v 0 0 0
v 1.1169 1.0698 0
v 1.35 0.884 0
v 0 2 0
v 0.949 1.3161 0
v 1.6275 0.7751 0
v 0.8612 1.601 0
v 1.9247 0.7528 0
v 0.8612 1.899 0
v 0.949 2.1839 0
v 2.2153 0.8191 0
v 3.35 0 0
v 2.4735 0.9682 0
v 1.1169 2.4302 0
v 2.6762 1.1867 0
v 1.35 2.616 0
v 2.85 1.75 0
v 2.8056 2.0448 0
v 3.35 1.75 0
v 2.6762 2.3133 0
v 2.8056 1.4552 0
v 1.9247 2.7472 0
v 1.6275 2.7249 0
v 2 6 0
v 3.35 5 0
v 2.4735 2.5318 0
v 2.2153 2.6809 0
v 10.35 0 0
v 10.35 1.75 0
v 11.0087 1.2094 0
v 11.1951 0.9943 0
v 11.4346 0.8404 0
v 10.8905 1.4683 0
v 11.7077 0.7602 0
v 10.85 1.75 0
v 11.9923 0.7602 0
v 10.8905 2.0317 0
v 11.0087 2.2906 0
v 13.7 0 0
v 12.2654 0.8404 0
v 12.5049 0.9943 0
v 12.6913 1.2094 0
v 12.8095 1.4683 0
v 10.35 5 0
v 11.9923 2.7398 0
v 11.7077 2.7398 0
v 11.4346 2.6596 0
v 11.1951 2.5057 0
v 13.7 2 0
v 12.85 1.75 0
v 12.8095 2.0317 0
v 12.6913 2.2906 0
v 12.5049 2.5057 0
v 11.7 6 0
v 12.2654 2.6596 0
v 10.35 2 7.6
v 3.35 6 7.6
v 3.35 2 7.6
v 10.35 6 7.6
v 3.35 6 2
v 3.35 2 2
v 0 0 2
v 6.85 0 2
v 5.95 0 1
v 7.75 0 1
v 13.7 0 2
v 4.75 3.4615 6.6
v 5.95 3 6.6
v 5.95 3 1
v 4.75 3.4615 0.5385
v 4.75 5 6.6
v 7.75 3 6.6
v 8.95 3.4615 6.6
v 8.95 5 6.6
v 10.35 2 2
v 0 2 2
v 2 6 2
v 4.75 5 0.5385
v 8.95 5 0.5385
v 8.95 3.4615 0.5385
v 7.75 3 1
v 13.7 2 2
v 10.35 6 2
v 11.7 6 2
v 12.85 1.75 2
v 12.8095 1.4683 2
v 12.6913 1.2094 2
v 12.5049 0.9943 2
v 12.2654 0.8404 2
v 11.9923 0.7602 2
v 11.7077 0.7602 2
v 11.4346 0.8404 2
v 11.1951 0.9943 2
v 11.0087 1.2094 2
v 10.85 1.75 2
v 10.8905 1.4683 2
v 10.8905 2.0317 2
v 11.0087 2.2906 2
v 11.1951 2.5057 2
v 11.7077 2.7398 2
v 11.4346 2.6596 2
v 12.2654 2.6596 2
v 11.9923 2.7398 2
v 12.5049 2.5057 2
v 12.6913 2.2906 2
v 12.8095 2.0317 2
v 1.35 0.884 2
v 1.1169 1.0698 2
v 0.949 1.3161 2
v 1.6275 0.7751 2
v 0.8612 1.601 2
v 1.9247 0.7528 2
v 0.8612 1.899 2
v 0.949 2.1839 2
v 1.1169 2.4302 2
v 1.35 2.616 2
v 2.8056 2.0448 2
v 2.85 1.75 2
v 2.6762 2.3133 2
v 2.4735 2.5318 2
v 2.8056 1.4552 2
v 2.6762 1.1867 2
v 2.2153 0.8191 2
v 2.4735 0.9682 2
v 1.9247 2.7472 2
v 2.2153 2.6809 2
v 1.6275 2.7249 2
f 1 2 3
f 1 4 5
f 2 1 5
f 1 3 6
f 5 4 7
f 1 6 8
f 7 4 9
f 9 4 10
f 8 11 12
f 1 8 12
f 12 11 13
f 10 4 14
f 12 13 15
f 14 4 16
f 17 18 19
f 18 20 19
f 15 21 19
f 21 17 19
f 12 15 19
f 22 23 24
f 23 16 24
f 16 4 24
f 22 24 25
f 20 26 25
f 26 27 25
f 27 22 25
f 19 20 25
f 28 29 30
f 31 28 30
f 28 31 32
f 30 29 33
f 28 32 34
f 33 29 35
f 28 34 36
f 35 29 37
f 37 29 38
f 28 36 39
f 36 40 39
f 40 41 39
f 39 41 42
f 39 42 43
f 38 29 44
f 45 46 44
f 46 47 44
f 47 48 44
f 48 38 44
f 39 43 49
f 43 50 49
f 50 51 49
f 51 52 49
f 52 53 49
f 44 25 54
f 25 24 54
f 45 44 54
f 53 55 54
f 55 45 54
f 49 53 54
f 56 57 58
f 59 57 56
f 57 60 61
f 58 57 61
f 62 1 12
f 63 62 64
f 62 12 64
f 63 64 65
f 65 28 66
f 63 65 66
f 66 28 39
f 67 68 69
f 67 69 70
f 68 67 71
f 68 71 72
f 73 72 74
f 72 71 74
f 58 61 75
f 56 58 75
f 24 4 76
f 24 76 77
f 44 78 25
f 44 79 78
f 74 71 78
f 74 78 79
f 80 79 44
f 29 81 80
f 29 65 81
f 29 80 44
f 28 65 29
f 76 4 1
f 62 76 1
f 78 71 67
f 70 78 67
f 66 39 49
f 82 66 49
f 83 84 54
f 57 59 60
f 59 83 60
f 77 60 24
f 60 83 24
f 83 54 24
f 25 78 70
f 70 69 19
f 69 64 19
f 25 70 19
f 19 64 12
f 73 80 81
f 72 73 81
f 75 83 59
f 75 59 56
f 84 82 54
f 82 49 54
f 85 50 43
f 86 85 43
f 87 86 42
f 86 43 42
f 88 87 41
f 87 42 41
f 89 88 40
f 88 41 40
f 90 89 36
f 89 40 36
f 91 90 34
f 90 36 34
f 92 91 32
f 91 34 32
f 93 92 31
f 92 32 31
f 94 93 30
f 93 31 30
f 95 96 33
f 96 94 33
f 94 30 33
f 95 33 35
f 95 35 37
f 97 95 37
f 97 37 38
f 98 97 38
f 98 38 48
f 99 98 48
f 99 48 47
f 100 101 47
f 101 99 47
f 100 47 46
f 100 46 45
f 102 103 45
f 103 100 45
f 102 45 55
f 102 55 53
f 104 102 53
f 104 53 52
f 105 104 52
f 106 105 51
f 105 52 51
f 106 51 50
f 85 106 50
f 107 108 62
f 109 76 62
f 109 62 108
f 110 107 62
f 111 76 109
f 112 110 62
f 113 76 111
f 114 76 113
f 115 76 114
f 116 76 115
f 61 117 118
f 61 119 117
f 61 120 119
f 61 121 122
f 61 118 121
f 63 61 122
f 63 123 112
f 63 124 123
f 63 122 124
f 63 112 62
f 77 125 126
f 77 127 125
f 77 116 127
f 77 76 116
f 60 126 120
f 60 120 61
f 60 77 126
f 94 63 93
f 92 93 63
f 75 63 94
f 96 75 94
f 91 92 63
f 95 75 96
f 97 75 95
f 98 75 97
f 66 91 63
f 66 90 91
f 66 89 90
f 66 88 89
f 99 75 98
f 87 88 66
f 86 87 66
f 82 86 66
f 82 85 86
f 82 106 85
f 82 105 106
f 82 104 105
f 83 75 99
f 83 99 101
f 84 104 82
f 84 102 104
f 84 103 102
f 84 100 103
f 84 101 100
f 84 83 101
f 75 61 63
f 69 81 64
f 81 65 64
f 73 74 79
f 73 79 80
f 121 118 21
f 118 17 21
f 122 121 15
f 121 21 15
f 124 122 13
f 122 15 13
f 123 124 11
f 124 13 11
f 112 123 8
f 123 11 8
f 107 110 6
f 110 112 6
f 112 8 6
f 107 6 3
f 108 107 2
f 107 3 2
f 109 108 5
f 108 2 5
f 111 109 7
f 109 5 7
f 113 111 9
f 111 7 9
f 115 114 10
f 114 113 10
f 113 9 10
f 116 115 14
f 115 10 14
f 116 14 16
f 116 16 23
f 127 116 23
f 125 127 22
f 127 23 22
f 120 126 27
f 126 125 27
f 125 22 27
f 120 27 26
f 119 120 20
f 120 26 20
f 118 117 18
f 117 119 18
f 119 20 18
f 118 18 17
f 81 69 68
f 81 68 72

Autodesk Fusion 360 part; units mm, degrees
sketch "mainBase" plane through (0, 0, 0) normal (0, 0, 1) x (1, 0, 0)
  line L0 (0, 0) -> (13.7, 0)
  line L1 (13.7, 0) -> (13.7, 6)
  line L2 (13.7, 6) -> (0, 6)
  line L3 (0, 6) -> (0, 0)
  line L4 (0, 0) -> (6.85, 0)
  line L5 (6.85, 0) -> (6.85, 1.75)
  line L6 (6.85, 1.75) -> (1.85, 1.75)
  line L7 (6.85, 1.75) -> (11.85, 1.75)
  line L8 (0, 6) -> (6.85, 6)
  circle A0 centre (1.85, 1.75) radius 1
  circle A1 centre (11.85, 1.75) radius 1
  line L9 (6.85, 6) -> (3.35, 6)
  line L10 (3.35, 6) -> (3.35, 2)
  line L11 (3.35, 2) -> (6.85, 2)
  line L12 (6.85, 2) -> (6.85, 6)
  line L13 (6.85, 6) -> (10.35, 6)
  line L14 (10.35, 6) -> (10.35, 2)
  line L15 (10.35, 2) -> (6.85, 2)
  line L16 (6.85, 2) -> (6.85, 6)
  dimension "d9" = 6
  dimension "d10" = 13.7
  dimension "d11" = 6.85
  dimension "d12" = 1.75
  dimension "d13" = 5
  dimension "d14" = 5
  dimension "d15" = 6.85
  dimension "d17" = 2
  dimension "d18" = 2
  dimension "d19" = 4
  dimension "d20" = 3.5
  dimension "d21" = 4
  dimension "d22" = 3.5
extrude "Extrude1" add sketch "mainBase" along normal blind 7.6 contours L2 L8 L9 L10 L11 L12 L16 | L2 L12 L13 L14 L15 L16
shell "Shell1" thickness 1 removed faces 1 at (5.6833, 4.6667, 0)
extrude "Extrude2" add sketch "mainBase" along normal blind 2 contours L0 L1 L2 L3 L4 L8 L10 L11 L14 L15
sketch "hallCutOut" plane through (0, 0, 0) normal (0, 0, 1) x (1, 0, 0)
  line L0 (0, 6) -> (6.85, 6)
  line L1 (6.85, 6) -> (6.85, 2)
  line L2 (6.85, 2) -> (3.35, 2)
  line L3 (3.35, 2) -> (3.35, 4)
  line L4 (6.85, 2) -> (6.85, 3)
  line L5 (6.85, 3) -> (5.95, 3)
  line L6 (5.95, 3) -> (3.35, 4)
  line L7 (6.85, 3) -> (7.75, 3)
  line L8 (6.85, 2) -> (10.35, 2)
  line L9 (10.35, 2) -> (10.35, 4)
  line L10 (10.35, 4) -> (7.75, 3)
  line L11 (7.75, 3) -> (9.35, 3)
  line L12 (9.35, 3) -> (9.35, 3.6154)
  line L13 (5.95, 3) -> (4.35, 3)
  line L14 (4.35, 3) -> (4.35, 3.6154)
  line L15 (6.85, 5) -> (8.95, 5)
  line L16 (8.95, 5) -> (8.95, 3)
  line L17 (8.95, 3) -> (6.85, 3)
  line L18 (6.85, 3) -> (6.85, 5)
  line L19 (6.85, 5) -> (4.75, 5)
  line L20 (4.75, 5) -> (4.75, 3)
  line L21 (4.75, 3) -> (6.85, 3)
  line L22 (6.85, 3) -> (6.85, 5)
  line L23 (9.35, 3) -> (4.35, 3)
  line L24 (4.35, 3) -> (4.35, 5)
  line L25 (4.35, 5) -> (9.35, 5)
  line L26 (9.35, 5) -> (9.35, 3)
  dimension "d31" = 6.85
  dimension "d32" = 4
  dimension "d33" = 3.5
  dimension "d34" = 2
  dimension "d35" = 1
  dimension "d36" = 0.9
  dimension "d37" = 0.9
  dimension "d38" = 3.5
  dimension "d39" = 2
  dimension "d59" = 2.1
extrude "Extrude3" add sketch "hallCutOut" along normal blind 6.6 contours L6 L13 L20 L21 L23 | L10 L11 L16 L17 L23 | L10 L11 L12 L16 L23 L26 | L6 L13 L14 L20 L23 L24
sketch "wireCutOut" plane through (0, 0, 0) normal (0, -1, 0) x (1, 0, 0)
  line L0 (0, 0) -> (13.7, 0)
  line L1 (13.7, 0) -> (13.7, 2)
  line L2 (13.7, 2) -> (0, 2)
  line L3 (0, 2) -> (0, 0)
  line L4 (0, 0) -> (6.85, 0)
  line L5 (6.85, 0) -> (6.85, 1)
  line L6 (6.85, 1) -> (5.95, 1)
  line L7 (6.85, 1) -> (7.75, 1)
  line L8 (6.85, 0) -> (13.7, 0)
  line L9 (6.85, 0) -> (10.35, 0)
  line L10 (6.85, 0) -> (3.35, 0)
  line L11 (7.75, 1) -> (10.35, 0)
  line L12 (5.95, 1) -> (3.35, 0)
  dimension "d42" = 6.85
  dimension "d43" = 1
  dimension "d44" = 0.9
  dimension "d45" = 0.9
  dimension "d46" = 6.85
  dimension "d47" = 3.5
  dimension "d48" = 3.5
extrude "Extrude4" cut sketch "wireCutOut" against normal blind 5 contours L0 L4 L5 L6 L10 L12 | L0 L5 L7 L8 L9 L11
sketch "cutOut" plane through (0, 0, 0) normal (0, 0, 1) x (1, 0, 0)
  line L0 (0, 0) -> (13.7, 0)
  line L1 (13.7, 0) -> (13.7, 6)
  line L2 (13.7, 6) -> (0, 6)
  line L3 (0, 6) -> (0, 0)
  line L4 (13.7, 0) -> (13.7, 2)
  line L5 (0, 0) -> (0, 2)
  line L6 (0, 6) -> (2, 6)
  line L7 (13.7, 6) -> (11.7, 6)
  line L8 (0, 2) -> (2, 6)
  line L9 (13.7, 2) -> (11.7, 6)
  dimension "d51" = 6
  dimension "d52" = 13.7
  dimension "d53" = 2
  dimension "d54" = 2
  dimension "d55" = 2
  dimension "d56" = 2
extrude "Extrude5" cut sketch "cutOut" along normal blind 2 contours L2 L3 L6 L8 | L1 L2 L7 L9
extrude "Extrude6" add sketch "hallCutOut" along normal blind 7.6 contours L10 L16 L25 L26 | L6 L20 L24 L25
extrude "Extrude7" cut sketch "wireCutOut" against normal blind 5 contours L0 L4 L5 L6 L10 L12 | L0 L5 L7 L8 L9 L11
equation "baseLength = 6 mm"
equation "baseWidth = 13.7 mm"
equation "mountingCircleToMountingCircle = 10 mm"
equation "mountingHoleFromEdge = 1.75 mm"
equation "hallEffectWidth = 7 mm"
equation "hallEffectLength = 4 mm"
equation "hallEffectHeight = 7.6 mm"
equation "baseHeight = 2 mm"
equation "d9 = baseLength"
equation "d10 = baseWidth"
equation "d11 = baseWidth / 2"
equation "d12 = mountingHoleFromEdge"
equation "d13 = mountingCircleToMountingCircle / 2"
equation "d14 = mountingCircleToMountingCircle / 2"
equation "d15 = baseWidth / 2"
equation "screwHole = 2 mm"
equation "d17 = screwHole"
equation "d18 = screwHole"
equation "d19 = hallEffectLength"
equation "d20 = hallEffectWidth / 2"
equation "d21 = hallEffectLength"
equation "d22 = hallEffectWidth / 2"
equation "d23 = hallEffectHeight"
equation "hallEffectThickness = 1 mm"
equation "d26 = hallEffectThickness"
equation "d27 = baseHeight"
equation "traingleHeight = 2 mm"
equation "hallEffectMiddleDist = 1.8 mm"
equation "d31 = baseWidth / 2"
equation "d32 = hallEffectLength"
equation "d33 = hallEffectWidth / 2"
equation "d34 = traingleHeight"
equation "d35 = hallEffectThickness"
equation "d36 = hallEffectMiddleDist / 2"
equation "d37 = hallEffectMiddleDist / 2"
equation "d38 = hallEffectWidth / 2"
equation "d39 = traingleHeight"
equation "d40 = hallEffectHeight - hallEffectThickness"
equation "d42 = baseWidth / 2"
equation "d43 = hallEffectThickness"
equation "d44 = hallEffectMiddleDist / 2"
equation "d45 = hallEffectMiddleDist / 2"
equation "d46 = baseWidth / 2"
equation "d47 = hallEffectWidth / 2"
equation "d48 = hallEffectWidth / 2"
equation "d51 = baseLength"
equation "d52 = baseWidth"
equation "d53 = baseLength / 3"
equation "d54 = baseLength / 3"
equation "d57 = baseHeight"
equation "d60 = hallEffectHeight"
